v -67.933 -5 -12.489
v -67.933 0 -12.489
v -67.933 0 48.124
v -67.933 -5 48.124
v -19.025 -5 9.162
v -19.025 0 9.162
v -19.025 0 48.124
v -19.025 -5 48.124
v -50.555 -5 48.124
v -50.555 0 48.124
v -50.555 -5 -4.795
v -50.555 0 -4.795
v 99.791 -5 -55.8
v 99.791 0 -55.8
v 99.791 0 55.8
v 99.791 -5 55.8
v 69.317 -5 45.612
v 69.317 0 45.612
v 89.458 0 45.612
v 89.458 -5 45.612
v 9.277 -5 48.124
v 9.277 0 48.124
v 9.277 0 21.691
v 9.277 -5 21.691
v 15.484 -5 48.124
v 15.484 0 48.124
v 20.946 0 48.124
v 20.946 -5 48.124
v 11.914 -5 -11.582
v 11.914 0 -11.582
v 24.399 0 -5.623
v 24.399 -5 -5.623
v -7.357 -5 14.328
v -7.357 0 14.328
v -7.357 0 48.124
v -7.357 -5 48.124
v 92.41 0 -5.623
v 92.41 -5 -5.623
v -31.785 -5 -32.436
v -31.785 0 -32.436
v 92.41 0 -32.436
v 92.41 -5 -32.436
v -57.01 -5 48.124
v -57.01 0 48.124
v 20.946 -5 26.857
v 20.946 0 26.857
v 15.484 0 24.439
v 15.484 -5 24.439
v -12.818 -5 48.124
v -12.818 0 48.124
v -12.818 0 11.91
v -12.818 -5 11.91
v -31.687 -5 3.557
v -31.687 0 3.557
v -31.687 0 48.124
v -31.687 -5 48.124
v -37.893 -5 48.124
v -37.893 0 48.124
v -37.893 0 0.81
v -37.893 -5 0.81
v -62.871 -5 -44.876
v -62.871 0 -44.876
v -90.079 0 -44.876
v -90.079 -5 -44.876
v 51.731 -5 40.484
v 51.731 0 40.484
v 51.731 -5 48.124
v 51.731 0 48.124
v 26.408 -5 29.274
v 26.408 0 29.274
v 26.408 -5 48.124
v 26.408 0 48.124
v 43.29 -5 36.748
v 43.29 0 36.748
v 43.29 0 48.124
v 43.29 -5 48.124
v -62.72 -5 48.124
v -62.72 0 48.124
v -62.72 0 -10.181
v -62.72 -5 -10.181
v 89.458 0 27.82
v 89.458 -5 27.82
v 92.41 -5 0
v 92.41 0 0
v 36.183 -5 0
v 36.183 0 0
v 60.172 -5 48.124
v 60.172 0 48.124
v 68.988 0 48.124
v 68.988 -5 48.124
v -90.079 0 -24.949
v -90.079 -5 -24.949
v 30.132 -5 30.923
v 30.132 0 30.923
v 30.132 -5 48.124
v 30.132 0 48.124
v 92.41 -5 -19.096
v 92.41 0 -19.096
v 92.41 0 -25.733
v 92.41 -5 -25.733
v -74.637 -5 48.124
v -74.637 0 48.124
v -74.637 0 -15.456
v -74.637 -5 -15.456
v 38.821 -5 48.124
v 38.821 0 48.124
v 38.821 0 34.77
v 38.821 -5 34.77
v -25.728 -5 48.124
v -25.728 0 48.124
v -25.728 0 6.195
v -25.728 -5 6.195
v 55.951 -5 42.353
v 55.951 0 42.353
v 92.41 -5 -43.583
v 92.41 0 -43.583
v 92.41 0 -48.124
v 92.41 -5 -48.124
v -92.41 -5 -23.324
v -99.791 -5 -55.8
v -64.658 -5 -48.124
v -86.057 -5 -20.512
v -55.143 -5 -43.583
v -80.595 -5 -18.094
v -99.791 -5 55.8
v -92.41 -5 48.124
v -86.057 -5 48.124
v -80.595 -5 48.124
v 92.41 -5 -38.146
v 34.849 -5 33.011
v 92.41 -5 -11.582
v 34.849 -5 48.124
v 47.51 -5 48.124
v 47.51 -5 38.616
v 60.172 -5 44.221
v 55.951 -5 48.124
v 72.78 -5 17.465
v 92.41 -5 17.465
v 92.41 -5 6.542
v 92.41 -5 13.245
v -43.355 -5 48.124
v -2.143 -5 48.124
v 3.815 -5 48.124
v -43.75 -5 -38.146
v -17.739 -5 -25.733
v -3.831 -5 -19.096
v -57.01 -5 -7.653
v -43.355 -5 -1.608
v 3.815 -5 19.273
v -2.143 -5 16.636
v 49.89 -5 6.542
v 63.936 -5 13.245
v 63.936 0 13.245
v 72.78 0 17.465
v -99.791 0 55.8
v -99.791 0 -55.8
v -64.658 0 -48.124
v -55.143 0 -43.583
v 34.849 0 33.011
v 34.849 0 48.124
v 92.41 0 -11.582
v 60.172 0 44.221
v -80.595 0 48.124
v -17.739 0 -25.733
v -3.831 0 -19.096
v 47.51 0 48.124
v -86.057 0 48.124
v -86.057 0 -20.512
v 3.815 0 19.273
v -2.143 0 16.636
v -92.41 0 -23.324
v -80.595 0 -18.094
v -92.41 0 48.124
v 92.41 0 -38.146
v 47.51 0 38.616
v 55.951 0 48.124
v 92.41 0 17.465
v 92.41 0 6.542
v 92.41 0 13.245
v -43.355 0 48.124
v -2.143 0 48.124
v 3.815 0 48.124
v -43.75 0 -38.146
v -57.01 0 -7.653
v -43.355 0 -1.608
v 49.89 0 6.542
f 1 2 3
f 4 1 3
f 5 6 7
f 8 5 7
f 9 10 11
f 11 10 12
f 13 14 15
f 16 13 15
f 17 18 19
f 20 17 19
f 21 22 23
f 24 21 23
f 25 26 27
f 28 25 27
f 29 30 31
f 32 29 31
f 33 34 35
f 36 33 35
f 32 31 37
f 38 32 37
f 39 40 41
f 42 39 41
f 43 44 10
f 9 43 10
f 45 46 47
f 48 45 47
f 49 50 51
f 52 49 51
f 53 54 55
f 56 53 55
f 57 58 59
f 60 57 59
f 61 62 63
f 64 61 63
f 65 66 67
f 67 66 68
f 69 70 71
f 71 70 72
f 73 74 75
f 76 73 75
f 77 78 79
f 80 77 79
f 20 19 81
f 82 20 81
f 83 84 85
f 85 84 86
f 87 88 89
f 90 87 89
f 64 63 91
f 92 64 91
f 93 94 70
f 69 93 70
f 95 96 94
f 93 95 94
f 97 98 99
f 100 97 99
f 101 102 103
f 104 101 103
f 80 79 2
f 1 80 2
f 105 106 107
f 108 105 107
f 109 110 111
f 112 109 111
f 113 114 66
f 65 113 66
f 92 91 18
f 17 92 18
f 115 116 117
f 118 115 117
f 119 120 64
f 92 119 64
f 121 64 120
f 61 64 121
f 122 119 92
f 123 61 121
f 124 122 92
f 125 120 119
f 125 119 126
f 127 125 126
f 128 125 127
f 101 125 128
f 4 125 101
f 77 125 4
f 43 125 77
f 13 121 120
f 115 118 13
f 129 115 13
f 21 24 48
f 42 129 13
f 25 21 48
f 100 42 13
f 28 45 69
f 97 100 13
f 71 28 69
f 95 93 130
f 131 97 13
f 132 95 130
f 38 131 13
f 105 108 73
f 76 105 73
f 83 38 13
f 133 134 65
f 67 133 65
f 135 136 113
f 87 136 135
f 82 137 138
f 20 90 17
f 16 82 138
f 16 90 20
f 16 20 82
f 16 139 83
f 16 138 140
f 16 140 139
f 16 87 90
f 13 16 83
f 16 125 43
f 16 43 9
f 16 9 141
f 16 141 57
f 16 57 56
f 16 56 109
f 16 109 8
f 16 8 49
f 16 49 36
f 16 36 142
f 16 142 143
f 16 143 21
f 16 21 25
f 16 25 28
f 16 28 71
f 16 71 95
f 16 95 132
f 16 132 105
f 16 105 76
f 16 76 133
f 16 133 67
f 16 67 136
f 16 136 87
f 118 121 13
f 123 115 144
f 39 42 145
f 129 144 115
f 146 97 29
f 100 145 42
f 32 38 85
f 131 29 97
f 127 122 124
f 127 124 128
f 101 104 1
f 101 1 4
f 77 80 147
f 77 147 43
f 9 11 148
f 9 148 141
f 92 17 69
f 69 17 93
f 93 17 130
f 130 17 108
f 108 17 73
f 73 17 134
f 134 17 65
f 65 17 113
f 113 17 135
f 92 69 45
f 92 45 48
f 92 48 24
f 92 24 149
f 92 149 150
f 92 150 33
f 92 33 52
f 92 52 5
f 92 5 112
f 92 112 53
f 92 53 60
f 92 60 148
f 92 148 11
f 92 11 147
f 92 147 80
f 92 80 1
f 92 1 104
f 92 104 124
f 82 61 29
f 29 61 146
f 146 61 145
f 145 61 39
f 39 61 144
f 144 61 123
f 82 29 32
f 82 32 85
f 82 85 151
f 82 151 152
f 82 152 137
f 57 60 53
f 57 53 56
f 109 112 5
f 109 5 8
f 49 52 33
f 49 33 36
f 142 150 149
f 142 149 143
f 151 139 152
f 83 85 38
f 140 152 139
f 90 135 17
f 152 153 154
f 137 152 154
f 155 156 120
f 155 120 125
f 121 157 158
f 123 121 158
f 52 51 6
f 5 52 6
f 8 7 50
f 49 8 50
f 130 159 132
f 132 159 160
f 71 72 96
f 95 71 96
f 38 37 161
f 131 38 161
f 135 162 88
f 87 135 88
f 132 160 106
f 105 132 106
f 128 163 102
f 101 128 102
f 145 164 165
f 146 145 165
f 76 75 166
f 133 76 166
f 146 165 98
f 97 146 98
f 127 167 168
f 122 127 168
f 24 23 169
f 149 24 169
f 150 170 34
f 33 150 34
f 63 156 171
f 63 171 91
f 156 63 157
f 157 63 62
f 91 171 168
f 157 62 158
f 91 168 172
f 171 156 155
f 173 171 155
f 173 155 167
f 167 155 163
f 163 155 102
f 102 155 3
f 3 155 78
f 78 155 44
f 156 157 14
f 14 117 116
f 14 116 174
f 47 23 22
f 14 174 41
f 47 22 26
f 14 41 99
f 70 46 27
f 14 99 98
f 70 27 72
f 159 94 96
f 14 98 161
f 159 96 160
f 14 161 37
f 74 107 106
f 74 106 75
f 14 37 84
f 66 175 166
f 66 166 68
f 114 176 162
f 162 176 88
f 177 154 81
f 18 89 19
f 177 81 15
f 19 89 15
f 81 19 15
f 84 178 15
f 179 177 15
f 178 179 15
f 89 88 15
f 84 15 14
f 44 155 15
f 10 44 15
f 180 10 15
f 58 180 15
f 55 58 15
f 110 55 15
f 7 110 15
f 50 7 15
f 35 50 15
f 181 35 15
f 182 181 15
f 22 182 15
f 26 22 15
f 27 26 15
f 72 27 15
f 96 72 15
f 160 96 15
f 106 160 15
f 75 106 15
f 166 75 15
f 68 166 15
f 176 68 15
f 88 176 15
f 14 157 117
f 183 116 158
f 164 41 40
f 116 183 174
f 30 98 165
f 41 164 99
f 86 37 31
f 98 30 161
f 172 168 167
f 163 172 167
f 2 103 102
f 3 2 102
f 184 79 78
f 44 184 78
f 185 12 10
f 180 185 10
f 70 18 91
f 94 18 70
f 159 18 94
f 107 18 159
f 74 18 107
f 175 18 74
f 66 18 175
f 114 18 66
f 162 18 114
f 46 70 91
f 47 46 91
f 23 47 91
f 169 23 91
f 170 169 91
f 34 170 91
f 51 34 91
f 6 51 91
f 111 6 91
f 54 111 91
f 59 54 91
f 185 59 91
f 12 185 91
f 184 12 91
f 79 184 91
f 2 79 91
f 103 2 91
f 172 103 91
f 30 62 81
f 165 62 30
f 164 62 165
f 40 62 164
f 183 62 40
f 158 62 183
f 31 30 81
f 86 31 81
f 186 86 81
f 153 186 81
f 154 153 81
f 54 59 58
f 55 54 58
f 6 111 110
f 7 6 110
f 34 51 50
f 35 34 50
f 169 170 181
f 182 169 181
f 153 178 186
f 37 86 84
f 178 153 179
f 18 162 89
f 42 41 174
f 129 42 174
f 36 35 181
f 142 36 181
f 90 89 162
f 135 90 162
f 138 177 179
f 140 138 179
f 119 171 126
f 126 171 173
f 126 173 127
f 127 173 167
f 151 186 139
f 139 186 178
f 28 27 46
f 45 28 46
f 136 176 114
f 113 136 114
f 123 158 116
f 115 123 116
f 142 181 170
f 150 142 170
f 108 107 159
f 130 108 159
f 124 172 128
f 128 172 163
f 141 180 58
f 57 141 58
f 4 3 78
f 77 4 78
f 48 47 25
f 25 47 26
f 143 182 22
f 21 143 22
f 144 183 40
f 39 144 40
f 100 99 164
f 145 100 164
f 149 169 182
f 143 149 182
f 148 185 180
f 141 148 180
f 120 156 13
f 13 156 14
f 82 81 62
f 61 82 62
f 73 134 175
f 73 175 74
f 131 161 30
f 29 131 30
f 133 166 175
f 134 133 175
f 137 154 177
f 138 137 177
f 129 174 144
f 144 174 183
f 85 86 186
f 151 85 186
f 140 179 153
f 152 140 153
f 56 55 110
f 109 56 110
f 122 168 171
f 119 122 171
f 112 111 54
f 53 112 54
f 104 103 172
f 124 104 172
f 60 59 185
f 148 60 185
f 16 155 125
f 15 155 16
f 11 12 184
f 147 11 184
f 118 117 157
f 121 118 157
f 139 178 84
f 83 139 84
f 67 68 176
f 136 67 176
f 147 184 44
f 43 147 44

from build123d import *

# Parameters (mm, degrees)
F0_W     = 199.582144
F0_H     = 111.60066
F1_DEPTH = 5


with BuildPart() as f1:
    # F0 (on Front) → F1 (new body)
    with BuildSketch(Plane.XZ):
        Rectangle(F0_W, F0_H)
        Polygon((92.410073, -48.124097), (-64.657532, -48.124097), (-55.142638, -43.583292), (92.410073, -43.583292), align=None, mode=Mode.SUBTRACT)
        Polygon((92.410073, -32.43614), (92.410073, -38.146261), (-43.749776, -38.146261), (-31.784674, -32.43614), align=None, mode=Mode.SUBTRACT)
        Polygon((92.410073, -19.095723), (92.410073, -25.732951), (-17.73868, -25.732951), (-3.830899, -19.095723), align=None, mode=Mode.SUBTRACT)
        Polygon((92.410073, -5.623395), (92.410073, -11.581782), (11.91396, -11.581782), (24.399283, -5.623395), align=None, mode=Mode.SUBTRACT)
        Polygon((-92.410073, -23.323948), (-92.410073, 48.124097), (-86.056881, 48.124097), (-86.056881, -20.511512), align=None, mode=Mode.SUBTRACT)
        Polygon((-80.595024, -18.093653), (-80.595024, 48.124097), (-74.636638, 48.124097), (-74.636638, -15.45599), align=None, mode=Mode.SUBTRACT)
        Polygon((-67.933455, -12.488619), (-67.933455, 48.124097), (-62.719867, 48.124097), (-62.719867, -10.180664), align=None, mode=Mode.SUBTRACT)
        Polygon((-57.009745, -7.652903), (-57.009745, 48.124097), (-50.554827, 48.124097), (-50.554827, -4.795435), align=None, mode=Mode.SUBTRACT)
        Polygon((-90.079022, -44.876456), (-90.079022, -24.949197), (69.316997, 45.612357), (89.457676, 45.612357), (89.457676, 27.819769), (-62.871436, -44.876456), align=None, mode=Mode.SUBTRACT)
        Polygon((-43.355107, -1.608257), (-43.355107, 48.124097), (-37.893251, 48.124097), (-37.893251, 0.809602), align=None, mode=Mode.SUBTRACT)
        Polygon((-31.6866, 3.557166), (-31.6866, 48.124097), (-25.728211, 48.124097), (-25.728211, 6.194831), align=None, mode=Mode.SUBTRACT)
        Polygon((-19.025026, 9.162202), (-19.025026, 48.124097), (-12.818373, 48.124097), (-12.818373, 11.909768), align=None, mode=Mode.SUBTRACT)
        Polygon((-7.356516, 14.327627), (-7.356516, 48.124097), (-2.142929, 48.124097), (-2.142929, 16.635582), align=None, mode=Mode.SUBTRACT)
        Polygon((92.410073, 6.541645), (92.410073, 0), (36.182657, 0), (49.89015, 6.541645), align=None, mode=Mode.SUBTRACT)
        Polygon((92.410073, 17.465357), (92.410073, 13.244831), (63.936138, 13.244831), (72.779912, 17.465357), align=None, mode=Mode.SUBTRACT)
        Polygon((3.81546, 19.273246), (3.81546, 48.124097), (9.277313, 48.124097), (9.277313, 21.691103), align=None, mode=Mode.SUBTRACT)
        Polygon((15.483965, 24.438669), (15.483965, 48.124097), (20.945825, 48.124097), (20.945825, 26.856529), align=None, mode=Mode.SUBTRACT)
        Polygon((26.407678, 29.274386), (26.407678, 48.124097), (30.13167, 48.124097), (30.13167, 30.922926), align=None, mode=Mode.SUBTRACT)
        Polygon((34.848724, 33.011075), (34.848724, 48.124097), (38.820986, 48.124097), (38.820986, 34.769519), align=None, mode=Mode.SUBTRACT)
        Polygon((43.289777, 36.747767), (43.289777, 48.124097), (47.5103, 48.124097), (47.5103, 38.616112), align=None, mode=Mode.SUBTRACT)
        Polygon((51.730823, 40.484456), (51.730823, 48.124097), (55.951346, 48.124097), (55.951346, 42.3528), align=None, mode=Mode.SUBTRACT)
        Polygon((60.171869, 44.221145), (60.171869, 48.124097), (68.988499, 48.124097), align=None, mode=Mode.SUBTRACT)
    extrude(amount=F1_DEPTH)


solid = f1.part
